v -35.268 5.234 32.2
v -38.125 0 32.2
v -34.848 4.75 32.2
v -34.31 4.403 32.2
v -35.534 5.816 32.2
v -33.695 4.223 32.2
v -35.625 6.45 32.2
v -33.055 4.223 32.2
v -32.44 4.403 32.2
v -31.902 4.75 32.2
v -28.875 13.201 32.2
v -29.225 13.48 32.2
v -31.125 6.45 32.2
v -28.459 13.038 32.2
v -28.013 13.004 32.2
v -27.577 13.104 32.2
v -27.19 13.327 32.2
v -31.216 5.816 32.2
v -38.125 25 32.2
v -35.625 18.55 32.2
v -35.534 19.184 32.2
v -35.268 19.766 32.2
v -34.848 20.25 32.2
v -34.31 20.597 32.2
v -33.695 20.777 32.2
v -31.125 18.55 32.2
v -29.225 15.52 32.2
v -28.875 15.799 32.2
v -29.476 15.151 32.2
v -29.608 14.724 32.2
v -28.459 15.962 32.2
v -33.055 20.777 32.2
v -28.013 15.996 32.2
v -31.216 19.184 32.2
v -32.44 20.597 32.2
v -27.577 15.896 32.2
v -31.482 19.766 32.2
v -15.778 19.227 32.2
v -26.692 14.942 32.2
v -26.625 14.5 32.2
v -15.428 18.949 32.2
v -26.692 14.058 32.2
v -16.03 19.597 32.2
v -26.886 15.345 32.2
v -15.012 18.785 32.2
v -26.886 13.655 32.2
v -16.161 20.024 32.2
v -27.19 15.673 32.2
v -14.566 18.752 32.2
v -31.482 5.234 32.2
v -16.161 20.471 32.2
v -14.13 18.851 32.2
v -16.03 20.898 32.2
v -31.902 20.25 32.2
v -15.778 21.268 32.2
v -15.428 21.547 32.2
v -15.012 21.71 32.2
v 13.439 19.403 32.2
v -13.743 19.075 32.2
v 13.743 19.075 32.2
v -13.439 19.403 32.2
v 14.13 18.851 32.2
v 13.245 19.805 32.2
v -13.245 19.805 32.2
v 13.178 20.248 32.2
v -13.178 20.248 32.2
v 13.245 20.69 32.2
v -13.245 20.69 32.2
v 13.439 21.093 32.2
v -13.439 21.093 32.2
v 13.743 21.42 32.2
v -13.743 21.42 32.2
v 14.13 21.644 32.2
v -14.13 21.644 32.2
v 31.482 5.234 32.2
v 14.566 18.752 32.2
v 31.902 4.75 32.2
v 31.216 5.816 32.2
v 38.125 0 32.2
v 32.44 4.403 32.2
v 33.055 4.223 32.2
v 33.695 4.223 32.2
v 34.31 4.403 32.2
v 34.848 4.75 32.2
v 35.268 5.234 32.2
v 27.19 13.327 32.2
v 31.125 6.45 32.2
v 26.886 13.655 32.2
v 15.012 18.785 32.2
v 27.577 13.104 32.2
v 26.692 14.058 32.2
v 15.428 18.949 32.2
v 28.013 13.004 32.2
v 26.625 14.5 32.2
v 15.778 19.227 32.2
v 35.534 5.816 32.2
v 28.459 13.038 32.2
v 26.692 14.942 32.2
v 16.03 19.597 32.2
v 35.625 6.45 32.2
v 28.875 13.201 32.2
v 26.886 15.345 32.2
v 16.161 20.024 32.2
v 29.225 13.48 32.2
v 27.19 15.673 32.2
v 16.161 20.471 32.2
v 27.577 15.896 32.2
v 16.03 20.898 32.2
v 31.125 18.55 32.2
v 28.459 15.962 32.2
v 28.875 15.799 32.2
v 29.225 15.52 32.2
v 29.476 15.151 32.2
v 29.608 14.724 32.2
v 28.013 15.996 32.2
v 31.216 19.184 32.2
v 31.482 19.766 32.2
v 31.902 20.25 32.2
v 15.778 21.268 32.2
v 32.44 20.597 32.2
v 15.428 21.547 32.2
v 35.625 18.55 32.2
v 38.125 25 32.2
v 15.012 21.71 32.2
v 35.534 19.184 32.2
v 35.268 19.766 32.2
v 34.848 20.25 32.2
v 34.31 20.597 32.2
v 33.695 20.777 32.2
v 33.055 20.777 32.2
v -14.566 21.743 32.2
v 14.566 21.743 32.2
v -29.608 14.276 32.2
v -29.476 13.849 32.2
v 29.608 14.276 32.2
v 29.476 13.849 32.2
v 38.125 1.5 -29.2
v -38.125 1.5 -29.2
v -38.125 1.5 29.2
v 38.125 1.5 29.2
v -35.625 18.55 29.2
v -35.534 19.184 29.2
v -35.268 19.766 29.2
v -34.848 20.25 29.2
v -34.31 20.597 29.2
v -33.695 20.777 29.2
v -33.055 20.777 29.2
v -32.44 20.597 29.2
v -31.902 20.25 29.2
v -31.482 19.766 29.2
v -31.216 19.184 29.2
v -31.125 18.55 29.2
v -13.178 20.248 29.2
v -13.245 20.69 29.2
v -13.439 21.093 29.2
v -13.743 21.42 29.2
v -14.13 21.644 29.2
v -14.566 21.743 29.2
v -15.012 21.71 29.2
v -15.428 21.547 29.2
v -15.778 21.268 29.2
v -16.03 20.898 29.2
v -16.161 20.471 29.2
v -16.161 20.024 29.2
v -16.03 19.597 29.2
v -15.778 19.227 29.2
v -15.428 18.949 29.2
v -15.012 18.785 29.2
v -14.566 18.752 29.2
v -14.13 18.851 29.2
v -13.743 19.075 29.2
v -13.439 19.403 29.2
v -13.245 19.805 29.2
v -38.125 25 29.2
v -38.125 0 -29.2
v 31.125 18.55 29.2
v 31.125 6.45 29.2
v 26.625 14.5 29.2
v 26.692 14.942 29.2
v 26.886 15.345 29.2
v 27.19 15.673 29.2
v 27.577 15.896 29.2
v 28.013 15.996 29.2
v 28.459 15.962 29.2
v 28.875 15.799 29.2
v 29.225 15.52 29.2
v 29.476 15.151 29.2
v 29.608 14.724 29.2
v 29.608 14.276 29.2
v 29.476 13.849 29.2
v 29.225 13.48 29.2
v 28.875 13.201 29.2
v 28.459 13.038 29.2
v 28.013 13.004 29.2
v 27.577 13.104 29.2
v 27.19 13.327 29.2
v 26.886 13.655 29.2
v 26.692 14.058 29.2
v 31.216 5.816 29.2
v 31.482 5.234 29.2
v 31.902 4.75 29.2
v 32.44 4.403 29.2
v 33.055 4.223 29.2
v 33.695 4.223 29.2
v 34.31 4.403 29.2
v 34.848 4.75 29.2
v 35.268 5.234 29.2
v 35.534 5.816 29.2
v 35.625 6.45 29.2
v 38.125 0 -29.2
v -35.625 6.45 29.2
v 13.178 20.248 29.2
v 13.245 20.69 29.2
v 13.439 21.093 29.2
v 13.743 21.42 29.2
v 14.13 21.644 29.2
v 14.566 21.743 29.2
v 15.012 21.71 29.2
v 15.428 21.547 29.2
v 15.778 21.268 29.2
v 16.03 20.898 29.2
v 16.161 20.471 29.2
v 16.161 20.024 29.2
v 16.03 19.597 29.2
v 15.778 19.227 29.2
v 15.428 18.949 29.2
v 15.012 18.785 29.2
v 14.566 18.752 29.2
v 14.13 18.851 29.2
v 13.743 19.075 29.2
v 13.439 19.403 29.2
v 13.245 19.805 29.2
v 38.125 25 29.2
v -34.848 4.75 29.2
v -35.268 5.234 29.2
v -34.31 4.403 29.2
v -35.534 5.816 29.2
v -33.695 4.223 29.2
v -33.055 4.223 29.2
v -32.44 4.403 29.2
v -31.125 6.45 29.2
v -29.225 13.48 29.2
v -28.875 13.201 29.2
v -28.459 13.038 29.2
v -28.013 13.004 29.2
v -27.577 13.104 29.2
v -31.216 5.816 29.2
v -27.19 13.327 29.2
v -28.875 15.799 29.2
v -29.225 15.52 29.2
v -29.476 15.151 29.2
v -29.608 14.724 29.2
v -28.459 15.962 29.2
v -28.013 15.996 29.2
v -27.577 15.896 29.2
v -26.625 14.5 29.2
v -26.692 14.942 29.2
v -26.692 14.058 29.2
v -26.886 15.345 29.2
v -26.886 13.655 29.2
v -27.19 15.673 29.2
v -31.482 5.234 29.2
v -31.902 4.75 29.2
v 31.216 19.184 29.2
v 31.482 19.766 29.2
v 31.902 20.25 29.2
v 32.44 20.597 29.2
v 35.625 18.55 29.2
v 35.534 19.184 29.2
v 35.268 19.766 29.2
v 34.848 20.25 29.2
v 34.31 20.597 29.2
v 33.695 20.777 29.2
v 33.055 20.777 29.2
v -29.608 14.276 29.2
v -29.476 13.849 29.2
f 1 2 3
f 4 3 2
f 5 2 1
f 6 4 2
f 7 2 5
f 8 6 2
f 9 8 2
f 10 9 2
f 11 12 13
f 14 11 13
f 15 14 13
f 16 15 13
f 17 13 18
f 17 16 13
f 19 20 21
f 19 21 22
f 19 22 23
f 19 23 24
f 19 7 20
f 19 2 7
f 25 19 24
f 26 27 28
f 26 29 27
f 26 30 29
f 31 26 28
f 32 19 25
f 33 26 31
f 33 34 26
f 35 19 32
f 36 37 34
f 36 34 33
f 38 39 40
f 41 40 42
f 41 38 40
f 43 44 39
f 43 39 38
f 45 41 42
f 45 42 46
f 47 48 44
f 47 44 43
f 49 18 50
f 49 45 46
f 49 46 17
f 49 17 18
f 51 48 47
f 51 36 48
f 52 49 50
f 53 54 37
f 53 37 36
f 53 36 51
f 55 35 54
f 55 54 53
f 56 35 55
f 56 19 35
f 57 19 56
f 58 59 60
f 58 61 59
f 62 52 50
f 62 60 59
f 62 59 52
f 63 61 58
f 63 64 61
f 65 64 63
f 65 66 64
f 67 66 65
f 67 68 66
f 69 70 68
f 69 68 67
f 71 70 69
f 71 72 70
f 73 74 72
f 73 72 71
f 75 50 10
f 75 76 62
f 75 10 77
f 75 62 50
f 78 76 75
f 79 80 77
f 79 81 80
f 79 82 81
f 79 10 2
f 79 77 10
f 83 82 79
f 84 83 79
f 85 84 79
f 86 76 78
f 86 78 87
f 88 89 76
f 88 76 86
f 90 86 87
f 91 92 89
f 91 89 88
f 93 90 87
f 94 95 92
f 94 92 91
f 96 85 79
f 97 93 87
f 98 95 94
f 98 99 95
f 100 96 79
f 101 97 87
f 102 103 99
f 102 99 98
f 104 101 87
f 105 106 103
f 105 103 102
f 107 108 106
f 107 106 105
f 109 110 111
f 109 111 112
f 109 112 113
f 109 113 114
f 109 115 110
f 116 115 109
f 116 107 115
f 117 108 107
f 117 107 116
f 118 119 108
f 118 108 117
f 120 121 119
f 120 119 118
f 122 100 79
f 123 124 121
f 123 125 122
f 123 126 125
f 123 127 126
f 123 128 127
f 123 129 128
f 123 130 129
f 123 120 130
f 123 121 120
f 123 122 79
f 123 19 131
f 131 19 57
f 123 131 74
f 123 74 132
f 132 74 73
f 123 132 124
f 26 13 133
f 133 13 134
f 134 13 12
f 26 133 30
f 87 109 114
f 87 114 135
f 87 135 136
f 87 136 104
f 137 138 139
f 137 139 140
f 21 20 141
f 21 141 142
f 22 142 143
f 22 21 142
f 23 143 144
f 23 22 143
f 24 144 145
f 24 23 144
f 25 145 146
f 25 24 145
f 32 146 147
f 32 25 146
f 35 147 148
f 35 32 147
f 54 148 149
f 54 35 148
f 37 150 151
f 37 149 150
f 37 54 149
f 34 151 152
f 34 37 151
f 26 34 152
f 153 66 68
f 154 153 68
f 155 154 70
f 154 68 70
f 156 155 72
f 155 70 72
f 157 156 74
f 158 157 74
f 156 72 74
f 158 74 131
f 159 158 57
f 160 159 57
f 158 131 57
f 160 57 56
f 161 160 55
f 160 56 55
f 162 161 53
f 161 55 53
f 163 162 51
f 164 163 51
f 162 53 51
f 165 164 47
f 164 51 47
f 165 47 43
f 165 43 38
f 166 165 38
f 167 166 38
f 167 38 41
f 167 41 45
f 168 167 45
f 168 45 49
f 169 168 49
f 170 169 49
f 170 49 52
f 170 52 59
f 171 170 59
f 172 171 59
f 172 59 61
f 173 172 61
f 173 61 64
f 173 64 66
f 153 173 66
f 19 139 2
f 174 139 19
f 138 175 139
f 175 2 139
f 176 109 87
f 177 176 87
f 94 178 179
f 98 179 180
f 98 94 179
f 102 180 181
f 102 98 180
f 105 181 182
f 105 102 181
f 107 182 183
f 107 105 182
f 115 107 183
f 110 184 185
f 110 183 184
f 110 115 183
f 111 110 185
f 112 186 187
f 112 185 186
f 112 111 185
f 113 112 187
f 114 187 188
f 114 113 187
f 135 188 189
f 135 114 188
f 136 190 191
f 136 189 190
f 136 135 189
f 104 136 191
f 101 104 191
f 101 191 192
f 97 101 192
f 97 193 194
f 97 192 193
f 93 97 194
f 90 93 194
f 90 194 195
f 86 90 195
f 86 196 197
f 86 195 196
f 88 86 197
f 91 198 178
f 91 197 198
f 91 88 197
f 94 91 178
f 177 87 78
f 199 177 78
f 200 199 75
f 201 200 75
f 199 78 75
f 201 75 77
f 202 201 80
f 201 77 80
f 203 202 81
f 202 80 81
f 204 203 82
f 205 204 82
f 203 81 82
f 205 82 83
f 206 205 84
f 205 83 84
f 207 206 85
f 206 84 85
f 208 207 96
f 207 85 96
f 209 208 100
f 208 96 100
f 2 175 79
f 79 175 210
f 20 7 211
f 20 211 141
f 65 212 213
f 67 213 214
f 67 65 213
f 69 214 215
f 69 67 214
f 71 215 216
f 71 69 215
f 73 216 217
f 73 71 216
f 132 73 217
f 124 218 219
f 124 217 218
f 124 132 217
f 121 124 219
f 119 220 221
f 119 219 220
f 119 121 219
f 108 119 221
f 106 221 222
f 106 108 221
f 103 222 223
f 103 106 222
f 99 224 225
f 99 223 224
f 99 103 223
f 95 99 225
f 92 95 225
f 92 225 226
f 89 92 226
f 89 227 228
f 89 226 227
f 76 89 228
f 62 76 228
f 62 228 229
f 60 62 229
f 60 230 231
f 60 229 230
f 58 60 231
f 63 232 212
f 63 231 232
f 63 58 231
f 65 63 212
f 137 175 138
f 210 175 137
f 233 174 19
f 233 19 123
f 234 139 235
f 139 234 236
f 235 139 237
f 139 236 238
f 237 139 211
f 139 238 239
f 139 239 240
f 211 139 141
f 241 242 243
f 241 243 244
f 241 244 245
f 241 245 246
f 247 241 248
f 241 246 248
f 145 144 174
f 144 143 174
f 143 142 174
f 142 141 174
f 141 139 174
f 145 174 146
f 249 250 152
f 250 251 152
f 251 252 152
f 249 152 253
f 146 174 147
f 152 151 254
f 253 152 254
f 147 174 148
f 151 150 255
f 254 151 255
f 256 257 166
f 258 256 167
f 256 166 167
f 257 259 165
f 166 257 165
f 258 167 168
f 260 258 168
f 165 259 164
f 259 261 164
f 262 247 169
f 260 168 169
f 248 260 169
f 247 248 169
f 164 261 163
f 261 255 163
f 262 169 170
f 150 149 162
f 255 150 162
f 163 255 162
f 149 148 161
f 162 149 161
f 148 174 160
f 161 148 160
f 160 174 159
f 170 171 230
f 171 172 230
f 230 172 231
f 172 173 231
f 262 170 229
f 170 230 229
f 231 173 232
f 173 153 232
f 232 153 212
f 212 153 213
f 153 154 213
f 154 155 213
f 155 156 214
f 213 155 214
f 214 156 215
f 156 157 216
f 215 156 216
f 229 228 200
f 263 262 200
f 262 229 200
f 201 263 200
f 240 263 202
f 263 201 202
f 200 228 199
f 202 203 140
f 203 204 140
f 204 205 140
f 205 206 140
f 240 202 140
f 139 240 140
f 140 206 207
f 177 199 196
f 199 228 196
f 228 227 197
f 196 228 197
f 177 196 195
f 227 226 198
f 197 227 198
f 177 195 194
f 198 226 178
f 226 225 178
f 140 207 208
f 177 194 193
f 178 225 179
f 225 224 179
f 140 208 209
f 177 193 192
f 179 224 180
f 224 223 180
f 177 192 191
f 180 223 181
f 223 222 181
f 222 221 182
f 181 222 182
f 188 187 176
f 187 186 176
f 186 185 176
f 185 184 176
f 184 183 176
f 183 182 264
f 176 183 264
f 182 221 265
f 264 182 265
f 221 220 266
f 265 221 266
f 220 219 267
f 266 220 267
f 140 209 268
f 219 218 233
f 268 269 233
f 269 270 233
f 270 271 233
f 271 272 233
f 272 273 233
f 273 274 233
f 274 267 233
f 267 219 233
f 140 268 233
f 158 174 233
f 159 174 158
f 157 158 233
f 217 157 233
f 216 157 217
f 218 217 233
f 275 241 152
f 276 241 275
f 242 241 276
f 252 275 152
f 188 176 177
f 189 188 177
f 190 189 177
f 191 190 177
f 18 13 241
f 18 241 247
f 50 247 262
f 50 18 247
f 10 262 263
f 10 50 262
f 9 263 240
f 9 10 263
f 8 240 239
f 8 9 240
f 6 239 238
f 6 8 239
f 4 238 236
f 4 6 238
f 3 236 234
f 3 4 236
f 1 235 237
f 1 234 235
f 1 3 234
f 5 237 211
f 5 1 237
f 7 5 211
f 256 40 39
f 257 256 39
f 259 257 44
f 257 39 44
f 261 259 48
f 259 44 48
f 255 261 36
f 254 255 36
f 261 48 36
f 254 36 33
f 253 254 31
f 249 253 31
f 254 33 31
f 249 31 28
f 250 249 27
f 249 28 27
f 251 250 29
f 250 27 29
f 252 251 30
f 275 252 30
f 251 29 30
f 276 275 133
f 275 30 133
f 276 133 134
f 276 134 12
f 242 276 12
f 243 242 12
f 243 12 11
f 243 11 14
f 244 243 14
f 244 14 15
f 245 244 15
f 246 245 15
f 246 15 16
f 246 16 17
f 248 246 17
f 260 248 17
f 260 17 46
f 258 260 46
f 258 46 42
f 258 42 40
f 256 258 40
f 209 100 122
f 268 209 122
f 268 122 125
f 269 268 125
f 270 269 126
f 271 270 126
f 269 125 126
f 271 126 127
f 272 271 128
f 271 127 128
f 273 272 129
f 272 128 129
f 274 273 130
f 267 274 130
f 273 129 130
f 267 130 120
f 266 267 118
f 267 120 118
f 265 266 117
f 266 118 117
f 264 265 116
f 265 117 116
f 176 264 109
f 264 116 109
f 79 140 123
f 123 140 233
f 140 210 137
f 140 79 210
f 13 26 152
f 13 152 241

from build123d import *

# Parameters (mm, degrees)
SKETCH1_W           = 76.25
SKETCH1_H           = 58.4
BOSS_EXTRUDE1_DEPTH = 1.5
SKETCH2_W           = 76.25
SKETCH2_H           = 25
BOSS_EXTRUDE2_DEPTH = 3
SKETCH3_R           = 1.5
CUT_EXTRUDE1_DEPTH  = 77.475326904


with BuildPart() as part:
    # Sketch1 → Boss-Extrude1 (new body)
    with BuildSketch(Plane(origin=(0, 0, 0), x_dir=(1, 0, 0), z_dir=(0, 1, 0))):
        Rectangle(SKETCH1_W, SKETCH1_H)
    extrude(amount=BOSS_EXTRUDE1_DEPTH)

    # Sketch2 → Boss-Extrude2 (add)
    with BuildSketch(Plane.XY.offset(29.2)):
        with Locations((0, 12.5)):
            Rectangle(SKETCH2_W, SKETCH2_H)
    extrude(amount=BOSS_EXTRUDE2_DEPTH)

    # Sketch3 → Cut-Extrude1 (cut, through all)
    with BuildSketch(Plane.XY.offset(32.2)):
        with Locations((-28.125, 14.5)):
            Circle(SKETCH3_R)
        with Locations((-14.678089157, 20.247551858)):
            Circle(SKETCH3_R)
        with BuildLine():
            Line((-31.125, 18.55), (-31.125, 6.45))
            ThreePointArc((-31.125, 6.45), (-33.375, 4.2), (-35.625, 6.45))
            Line((-35.625, 6.45), (-35.625, 18.55))
            ThreePointArc((-35.625, 18.55), (-33.375, 20.8), (-31.125, 18.55))
        make_face()
    cut_extrude1 = extrude(amount=-CUT_EXTRUDE1_DEPTH, mode=Mode.SUBTRACT)

    # Mirror1: Cut-Extrude1 across plane
    add(cut_extrude1.mirror(Plane(origin=(0, 0, 0), x_dir=(0, 0, 1), z_dir=(1, 0, 0))), mode=Mode.SUBTRACT)


solid = part.part
